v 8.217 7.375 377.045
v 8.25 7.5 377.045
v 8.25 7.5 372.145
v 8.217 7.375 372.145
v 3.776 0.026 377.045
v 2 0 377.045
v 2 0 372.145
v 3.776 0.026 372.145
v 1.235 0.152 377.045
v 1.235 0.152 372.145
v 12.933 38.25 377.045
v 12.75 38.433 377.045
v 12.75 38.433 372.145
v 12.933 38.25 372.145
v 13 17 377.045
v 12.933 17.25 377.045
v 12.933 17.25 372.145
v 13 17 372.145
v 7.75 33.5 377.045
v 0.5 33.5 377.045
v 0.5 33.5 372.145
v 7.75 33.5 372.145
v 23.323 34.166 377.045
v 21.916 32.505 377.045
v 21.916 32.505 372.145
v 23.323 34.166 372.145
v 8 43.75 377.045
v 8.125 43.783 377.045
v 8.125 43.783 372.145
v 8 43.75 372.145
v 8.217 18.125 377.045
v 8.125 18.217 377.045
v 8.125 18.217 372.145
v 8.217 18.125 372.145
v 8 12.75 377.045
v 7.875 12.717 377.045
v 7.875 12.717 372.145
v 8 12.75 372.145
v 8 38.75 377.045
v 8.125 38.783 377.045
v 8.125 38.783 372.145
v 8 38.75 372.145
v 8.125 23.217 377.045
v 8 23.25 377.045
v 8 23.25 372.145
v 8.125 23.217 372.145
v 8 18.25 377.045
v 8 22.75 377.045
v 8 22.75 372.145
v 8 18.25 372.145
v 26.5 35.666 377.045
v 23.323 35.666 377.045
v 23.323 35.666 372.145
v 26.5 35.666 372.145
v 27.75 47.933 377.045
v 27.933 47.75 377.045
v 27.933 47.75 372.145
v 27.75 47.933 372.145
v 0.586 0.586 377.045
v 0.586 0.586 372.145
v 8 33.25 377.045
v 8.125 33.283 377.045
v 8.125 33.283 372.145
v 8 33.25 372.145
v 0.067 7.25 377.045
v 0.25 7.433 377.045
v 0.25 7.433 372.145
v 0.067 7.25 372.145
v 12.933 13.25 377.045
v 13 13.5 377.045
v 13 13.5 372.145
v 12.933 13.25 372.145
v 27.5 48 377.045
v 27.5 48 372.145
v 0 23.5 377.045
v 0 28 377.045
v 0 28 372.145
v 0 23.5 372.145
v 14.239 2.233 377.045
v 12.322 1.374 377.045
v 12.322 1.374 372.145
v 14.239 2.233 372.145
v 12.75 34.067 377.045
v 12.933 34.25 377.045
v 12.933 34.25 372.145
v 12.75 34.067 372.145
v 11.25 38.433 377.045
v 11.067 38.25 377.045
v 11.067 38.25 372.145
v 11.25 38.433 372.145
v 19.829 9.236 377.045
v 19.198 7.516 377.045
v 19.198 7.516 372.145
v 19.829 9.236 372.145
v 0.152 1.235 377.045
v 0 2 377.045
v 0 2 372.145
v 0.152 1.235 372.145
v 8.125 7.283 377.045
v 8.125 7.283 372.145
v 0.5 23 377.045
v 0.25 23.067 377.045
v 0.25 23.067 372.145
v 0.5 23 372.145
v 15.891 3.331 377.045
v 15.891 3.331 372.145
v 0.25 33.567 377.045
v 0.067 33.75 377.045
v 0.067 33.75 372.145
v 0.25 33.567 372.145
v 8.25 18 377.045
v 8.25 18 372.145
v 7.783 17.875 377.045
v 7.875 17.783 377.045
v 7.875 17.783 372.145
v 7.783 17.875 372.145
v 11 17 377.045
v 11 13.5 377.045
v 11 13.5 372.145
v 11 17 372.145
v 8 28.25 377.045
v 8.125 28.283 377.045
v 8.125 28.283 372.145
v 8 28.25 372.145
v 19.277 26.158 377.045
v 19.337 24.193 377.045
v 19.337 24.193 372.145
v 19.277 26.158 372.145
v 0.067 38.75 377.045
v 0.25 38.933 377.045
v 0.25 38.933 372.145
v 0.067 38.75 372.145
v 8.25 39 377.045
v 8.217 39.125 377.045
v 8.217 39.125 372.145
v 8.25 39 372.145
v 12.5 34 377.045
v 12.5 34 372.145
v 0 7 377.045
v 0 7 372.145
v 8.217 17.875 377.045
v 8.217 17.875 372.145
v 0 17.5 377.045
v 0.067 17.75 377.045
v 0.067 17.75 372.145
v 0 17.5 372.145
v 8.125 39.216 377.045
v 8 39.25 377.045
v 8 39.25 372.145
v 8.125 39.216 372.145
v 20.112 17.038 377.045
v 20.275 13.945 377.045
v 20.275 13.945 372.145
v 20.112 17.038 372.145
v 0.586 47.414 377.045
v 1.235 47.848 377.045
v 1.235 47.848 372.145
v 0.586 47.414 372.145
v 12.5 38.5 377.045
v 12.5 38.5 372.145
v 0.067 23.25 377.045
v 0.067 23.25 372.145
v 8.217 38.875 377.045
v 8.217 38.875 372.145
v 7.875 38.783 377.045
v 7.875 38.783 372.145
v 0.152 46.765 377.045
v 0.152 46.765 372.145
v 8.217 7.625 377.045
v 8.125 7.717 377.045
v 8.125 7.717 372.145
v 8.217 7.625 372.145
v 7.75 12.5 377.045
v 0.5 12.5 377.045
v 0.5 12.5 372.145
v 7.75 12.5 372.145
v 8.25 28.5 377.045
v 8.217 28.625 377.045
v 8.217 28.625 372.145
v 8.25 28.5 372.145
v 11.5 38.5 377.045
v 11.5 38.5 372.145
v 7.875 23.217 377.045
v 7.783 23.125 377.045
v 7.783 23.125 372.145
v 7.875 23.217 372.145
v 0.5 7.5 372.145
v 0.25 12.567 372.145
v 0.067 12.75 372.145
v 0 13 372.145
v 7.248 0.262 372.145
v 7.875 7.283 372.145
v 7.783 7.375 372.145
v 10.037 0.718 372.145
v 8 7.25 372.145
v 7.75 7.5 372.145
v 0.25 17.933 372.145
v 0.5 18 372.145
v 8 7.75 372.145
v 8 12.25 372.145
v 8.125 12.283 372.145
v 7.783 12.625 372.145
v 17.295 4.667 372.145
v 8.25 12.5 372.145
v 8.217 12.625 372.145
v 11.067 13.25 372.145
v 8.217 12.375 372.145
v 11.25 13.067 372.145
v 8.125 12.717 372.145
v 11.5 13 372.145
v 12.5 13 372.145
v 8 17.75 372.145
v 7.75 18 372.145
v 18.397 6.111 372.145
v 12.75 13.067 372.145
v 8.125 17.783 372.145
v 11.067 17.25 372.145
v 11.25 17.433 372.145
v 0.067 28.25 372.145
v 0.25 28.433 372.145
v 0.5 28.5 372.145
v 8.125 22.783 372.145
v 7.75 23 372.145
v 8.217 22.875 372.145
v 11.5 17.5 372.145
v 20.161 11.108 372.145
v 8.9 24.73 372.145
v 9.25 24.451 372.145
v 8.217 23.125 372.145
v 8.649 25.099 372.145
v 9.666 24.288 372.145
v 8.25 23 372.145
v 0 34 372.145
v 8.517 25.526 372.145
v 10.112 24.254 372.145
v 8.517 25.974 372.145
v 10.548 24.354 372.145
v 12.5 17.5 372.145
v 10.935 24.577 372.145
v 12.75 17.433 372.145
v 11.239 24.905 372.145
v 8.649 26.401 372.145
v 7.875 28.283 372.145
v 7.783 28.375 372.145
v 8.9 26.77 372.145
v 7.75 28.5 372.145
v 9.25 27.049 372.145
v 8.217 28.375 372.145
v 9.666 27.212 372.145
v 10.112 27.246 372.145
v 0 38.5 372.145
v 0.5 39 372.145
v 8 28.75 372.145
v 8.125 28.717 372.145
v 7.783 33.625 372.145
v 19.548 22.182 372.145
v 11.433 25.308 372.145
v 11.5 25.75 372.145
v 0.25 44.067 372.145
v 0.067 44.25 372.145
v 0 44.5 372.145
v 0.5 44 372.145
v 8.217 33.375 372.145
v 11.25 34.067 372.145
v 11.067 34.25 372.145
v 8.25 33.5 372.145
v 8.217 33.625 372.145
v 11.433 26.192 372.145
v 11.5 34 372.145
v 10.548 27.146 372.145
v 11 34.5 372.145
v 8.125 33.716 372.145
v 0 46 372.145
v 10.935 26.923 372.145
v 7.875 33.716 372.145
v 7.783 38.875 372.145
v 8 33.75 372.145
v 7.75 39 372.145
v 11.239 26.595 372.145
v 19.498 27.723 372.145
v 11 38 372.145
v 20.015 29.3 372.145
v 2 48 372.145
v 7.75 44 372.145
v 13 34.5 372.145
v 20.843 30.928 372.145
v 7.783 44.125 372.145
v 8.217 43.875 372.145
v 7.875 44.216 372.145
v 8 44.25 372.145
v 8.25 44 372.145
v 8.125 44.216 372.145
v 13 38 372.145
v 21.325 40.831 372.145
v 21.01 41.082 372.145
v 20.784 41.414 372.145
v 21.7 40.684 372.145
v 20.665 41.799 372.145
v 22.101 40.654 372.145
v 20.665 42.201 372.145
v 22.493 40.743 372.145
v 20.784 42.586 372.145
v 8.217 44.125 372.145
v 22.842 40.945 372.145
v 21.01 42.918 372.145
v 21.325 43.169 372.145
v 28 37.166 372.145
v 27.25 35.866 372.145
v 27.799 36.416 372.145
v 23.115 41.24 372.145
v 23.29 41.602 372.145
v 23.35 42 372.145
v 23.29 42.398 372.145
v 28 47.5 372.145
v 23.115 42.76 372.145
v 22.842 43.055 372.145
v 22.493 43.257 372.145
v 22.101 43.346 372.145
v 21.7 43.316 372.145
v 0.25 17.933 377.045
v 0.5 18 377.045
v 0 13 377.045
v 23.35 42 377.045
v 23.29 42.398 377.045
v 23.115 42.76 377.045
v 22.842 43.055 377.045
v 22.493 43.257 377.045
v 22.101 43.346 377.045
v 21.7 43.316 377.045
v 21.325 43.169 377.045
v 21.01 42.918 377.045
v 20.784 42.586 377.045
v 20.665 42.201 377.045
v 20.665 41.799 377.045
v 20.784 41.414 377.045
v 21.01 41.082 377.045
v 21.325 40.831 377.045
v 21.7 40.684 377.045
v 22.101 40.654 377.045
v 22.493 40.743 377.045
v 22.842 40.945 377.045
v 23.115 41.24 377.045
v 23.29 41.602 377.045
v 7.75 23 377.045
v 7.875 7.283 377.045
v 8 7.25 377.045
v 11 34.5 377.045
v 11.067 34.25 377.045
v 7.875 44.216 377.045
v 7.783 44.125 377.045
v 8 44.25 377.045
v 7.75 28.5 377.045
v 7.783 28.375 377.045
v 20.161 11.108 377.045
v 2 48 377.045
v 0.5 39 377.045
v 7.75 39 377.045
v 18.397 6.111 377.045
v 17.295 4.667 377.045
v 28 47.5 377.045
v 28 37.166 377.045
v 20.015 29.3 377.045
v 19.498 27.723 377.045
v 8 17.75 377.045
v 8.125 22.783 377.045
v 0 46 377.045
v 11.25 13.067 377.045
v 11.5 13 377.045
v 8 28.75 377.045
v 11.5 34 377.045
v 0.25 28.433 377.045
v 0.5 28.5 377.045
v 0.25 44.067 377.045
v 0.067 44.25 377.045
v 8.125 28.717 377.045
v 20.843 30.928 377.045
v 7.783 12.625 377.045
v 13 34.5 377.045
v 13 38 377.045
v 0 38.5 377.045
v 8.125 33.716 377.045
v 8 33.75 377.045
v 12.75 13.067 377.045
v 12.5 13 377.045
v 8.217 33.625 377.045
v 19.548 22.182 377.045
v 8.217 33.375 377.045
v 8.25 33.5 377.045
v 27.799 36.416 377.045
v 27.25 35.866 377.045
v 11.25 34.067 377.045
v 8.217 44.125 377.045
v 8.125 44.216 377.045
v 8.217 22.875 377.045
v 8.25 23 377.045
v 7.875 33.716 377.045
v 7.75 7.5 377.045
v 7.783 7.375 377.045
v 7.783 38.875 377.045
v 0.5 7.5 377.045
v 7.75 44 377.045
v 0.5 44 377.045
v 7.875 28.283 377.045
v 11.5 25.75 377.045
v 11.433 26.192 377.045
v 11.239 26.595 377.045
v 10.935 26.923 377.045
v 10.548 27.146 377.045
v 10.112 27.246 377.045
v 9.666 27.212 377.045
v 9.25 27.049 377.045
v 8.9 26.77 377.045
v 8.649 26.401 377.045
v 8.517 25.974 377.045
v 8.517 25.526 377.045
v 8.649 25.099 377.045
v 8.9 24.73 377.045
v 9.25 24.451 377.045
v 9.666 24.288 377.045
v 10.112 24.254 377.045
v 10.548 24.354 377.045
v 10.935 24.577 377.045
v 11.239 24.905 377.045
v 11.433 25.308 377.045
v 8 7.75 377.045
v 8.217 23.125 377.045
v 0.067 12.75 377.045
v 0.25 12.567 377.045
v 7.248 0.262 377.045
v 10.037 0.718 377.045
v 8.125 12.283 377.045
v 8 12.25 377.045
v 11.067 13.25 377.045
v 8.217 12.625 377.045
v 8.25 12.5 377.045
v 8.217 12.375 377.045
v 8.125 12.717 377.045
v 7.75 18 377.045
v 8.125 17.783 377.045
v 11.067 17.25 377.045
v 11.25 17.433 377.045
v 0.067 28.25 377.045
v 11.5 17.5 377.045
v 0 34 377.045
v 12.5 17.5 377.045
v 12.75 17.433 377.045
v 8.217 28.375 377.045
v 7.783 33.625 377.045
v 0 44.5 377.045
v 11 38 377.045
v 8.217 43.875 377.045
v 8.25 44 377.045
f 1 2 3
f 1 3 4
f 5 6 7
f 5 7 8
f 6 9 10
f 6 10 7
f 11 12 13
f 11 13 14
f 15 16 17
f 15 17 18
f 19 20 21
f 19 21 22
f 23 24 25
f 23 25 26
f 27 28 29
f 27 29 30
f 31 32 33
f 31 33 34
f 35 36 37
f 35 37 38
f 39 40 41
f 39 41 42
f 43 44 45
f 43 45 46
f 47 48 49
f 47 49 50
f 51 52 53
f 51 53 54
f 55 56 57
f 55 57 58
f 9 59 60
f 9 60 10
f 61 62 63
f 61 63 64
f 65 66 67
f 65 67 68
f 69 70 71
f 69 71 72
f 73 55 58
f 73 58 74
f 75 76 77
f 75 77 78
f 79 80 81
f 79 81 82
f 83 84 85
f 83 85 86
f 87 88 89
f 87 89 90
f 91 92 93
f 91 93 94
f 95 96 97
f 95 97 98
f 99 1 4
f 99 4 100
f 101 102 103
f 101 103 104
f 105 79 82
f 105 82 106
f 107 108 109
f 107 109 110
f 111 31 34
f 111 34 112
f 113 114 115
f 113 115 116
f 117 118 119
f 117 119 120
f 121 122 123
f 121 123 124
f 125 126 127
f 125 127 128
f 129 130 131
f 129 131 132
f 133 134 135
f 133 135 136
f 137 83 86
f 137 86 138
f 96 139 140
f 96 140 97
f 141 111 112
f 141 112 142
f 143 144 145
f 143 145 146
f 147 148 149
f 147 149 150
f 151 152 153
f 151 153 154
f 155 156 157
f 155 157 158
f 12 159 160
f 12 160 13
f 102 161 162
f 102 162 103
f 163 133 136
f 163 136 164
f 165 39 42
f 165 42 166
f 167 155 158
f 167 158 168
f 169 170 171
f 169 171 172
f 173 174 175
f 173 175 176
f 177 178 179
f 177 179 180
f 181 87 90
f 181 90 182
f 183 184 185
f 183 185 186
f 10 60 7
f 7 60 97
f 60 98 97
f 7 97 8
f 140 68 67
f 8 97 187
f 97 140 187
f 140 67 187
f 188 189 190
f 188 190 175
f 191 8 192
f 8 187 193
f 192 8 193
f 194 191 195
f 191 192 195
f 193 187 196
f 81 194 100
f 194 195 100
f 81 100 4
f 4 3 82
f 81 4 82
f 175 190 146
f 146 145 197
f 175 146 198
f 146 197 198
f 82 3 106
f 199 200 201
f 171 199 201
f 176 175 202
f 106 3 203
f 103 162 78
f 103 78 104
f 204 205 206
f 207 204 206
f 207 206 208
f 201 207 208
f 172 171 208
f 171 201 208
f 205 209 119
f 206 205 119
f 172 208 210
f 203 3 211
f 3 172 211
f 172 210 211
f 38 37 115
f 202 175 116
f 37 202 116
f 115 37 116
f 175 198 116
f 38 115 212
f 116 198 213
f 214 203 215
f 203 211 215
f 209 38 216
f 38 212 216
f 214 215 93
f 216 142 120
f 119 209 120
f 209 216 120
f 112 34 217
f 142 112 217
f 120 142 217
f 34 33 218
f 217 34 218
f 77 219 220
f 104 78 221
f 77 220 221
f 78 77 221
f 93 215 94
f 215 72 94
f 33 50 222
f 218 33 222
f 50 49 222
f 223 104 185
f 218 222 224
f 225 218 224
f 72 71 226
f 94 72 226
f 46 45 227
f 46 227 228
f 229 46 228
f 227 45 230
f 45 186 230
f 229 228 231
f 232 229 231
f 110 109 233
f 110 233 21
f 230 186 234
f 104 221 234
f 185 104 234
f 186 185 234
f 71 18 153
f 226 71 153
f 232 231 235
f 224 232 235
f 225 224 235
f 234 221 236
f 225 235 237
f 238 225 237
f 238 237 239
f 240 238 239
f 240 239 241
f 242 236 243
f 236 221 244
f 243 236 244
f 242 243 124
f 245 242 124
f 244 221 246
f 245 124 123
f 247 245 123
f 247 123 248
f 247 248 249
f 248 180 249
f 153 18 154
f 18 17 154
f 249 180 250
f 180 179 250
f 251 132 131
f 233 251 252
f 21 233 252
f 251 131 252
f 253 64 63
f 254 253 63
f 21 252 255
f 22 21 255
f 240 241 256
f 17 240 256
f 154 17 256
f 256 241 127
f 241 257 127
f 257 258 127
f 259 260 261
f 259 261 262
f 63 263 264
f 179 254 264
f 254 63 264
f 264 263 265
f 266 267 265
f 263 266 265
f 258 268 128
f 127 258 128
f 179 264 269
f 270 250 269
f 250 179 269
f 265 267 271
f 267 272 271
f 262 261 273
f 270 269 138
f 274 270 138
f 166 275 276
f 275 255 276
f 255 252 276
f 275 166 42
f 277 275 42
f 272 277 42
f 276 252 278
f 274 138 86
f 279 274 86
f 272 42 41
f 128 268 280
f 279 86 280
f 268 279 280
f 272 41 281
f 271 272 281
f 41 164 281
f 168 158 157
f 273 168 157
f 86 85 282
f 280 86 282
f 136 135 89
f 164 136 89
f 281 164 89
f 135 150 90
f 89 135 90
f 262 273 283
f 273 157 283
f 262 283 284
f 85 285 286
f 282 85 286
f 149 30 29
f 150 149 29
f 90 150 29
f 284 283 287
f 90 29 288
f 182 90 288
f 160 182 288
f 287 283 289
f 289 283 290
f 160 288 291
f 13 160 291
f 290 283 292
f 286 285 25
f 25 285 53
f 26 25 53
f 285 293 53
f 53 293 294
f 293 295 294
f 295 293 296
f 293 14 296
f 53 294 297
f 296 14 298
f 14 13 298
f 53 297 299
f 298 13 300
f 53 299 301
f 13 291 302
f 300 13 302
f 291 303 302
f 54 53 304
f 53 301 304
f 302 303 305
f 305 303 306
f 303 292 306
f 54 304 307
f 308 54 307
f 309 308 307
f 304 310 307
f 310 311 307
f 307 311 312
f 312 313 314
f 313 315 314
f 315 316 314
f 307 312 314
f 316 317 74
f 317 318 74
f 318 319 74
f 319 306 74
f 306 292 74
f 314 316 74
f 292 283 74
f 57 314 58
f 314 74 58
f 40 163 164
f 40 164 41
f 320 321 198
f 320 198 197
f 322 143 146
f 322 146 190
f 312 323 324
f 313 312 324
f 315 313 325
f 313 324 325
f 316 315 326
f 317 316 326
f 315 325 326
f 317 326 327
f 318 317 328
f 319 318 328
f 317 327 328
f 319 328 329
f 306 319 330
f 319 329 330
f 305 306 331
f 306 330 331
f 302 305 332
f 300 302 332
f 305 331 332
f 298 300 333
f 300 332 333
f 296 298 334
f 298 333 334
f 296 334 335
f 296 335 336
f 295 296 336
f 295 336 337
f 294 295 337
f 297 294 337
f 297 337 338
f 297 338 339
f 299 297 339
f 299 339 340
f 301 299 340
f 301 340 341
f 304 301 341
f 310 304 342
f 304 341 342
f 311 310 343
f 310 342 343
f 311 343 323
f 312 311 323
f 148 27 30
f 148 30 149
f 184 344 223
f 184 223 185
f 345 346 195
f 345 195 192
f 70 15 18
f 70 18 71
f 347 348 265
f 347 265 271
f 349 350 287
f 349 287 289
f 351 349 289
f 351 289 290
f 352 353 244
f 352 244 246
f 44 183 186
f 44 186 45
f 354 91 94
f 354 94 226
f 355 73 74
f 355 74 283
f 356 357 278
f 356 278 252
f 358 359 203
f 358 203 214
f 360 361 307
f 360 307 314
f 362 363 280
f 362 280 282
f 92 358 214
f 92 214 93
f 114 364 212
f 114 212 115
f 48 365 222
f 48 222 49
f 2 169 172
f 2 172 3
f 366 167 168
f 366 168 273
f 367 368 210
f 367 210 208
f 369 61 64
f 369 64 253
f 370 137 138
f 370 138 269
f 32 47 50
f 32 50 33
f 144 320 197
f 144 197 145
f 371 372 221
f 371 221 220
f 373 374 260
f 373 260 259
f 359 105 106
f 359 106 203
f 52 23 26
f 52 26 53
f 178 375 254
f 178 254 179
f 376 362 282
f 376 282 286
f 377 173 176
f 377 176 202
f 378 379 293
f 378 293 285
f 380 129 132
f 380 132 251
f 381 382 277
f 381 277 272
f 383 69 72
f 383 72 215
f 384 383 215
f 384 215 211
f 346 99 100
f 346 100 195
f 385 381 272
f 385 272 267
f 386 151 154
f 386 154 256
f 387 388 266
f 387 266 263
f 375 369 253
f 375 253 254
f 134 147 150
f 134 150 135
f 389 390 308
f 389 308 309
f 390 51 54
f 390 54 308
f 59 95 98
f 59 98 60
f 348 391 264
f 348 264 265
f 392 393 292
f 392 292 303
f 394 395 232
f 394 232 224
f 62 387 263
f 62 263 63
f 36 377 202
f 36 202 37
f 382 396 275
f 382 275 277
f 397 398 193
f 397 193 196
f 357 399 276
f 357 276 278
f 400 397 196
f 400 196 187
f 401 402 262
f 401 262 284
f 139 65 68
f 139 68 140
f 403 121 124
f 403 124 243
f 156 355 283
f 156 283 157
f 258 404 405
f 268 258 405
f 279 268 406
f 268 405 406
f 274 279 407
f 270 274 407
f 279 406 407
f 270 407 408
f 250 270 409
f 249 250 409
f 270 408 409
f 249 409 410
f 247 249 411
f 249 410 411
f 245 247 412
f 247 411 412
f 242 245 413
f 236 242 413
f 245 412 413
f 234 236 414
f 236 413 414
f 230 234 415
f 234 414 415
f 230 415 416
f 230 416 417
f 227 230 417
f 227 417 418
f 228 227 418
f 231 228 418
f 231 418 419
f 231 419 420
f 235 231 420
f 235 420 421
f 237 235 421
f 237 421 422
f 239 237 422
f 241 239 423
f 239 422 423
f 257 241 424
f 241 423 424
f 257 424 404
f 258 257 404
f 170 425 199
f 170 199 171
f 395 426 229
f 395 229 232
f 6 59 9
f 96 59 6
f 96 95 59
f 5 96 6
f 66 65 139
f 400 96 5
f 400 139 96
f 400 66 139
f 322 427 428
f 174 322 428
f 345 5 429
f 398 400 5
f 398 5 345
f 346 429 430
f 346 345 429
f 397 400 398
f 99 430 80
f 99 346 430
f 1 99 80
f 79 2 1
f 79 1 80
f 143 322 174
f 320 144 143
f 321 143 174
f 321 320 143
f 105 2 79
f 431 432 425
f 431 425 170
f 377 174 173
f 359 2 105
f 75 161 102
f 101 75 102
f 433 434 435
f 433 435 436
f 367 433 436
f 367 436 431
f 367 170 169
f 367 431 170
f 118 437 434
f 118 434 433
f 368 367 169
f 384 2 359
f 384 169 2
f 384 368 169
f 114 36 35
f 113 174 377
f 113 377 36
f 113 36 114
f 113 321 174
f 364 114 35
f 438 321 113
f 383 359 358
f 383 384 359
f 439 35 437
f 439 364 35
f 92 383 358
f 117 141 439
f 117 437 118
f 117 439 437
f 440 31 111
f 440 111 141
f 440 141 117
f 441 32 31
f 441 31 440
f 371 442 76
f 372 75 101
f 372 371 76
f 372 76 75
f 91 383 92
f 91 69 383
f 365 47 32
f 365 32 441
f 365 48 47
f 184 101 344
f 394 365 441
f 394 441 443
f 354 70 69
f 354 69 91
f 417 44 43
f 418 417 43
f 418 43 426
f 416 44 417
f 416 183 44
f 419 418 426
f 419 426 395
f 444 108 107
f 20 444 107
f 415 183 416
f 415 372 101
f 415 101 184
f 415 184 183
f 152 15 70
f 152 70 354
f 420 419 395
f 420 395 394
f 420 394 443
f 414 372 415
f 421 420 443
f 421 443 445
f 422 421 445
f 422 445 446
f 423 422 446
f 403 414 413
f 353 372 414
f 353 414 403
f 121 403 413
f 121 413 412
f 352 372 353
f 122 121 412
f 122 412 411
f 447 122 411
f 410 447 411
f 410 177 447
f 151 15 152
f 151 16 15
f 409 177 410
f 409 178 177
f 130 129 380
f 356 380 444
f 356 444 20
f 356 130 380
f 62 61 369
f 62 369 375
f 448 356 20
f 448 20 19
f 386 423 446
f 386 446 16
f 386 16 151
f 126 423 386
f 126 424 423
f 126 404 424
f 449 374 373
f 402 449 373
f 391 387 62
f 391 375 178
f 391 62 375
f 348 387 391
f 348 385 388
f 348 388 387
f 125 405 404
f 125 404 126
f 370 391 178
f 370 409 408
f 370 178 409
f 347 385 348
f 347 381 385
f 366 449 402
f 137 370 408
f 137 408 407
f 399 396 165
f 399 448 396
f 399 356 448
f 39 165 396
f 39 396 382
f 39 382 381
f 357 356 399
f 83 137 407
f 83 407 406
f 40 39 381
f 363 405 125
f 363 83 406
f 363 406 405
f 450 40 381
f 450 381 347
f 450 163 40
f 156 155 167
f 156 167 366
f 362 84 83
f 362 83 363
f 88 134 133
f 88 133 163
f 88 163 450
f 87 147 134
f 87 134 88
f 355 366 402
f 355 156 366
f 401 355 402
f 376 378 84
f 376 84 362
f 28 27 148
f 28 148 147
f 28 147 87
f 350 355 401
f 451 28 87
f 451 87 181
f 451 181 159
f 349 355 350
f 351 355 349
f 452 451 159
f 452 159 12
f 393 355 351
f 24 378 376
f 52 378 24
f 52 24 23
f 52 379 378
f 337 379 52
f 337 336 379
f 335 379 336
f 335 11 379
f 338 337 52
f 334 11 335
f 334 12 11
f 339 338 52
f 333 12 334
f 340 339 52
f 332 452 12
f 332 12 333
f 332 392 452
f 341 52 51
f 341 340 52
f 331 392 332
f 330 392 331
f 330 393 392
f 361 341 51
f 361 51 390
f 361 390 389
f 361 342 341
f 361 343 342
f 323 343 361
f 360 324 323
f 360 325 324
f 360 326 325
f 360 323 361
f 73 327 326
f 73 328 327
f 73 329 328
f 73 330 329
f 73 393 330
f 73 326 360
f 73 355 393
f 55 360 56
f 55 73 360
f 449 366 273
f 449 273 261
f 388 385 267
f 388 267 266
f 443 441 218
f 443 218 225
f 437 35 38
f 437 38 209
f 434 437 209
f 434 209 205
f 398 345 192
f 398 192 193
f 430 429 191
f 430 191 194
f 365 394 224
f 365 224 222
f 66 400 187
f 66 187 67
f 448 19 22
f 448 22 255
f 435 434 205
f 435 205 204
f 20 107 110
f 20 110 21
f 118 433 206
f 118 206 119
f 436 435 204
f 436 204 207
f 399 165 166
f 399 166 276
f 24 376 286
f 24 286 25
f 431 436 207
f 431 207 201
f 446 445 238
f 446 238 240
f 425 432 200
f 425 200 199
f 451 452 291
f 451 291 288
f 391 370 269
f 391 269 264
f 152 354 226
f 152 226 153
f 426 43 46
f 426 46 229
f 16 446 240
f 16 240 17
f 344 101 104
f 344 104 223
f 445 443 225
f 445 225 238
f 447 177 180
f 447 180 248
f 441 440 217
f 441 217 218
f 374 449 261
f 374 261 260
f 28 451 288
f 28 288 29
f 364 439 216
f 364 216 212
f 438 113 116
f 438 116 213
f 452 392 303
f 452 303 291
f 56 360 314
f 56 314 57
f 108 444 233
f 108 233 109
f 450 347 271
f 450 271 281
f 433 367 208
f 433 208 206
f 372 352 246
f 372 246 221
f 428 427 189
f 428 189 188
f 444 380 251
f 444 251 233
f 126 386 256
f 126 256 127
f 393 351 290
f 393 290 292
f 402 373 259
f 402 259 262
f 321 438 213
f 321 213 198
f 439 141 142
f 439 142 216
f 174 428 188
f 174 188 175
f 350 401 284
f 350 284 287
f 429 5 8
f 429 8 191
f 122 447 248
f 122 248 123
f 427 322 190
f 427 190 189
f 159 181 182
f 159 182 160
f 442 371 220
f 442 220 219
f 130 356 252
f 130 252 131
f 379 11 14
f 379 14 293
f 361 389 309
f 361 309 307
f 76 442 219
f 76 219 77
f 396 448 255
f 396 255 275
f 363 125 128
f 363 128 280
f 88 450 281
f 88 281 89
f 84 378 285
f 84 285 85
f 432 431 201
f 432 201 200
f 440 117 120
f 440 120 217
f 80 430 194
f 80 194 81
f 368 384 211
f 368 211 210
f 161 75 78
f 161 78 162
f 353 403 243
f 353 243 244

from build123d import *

# Parameters (mm, degrees)
ESQUISSE1_R        = 1.35
ESQUISSE1_R_2      = 1.5
BOSS_EXTRU_1_DEPTH = 4.9


with BuildPart() as part:
    # Esquisse1 → Boss.-Extru.1 (new body)
    with BuildSketch(Plane.XY.offset(377.0447)):
        Polygon((15.891185209, 3.330523996), (17.295074786, 4.667009593), (18.397064454, 6.110993158), (19.198464212, 7.515709734), (19.829414022, 9.236036216), (20.160733922, 11.107826651), (20.275133888, 13.944835796), (20.111733937, 17.038324864), (19.548124107, 22.181683313), (19.336824171, 24.193402707), (19.277384189, 26.157782114), (19.497574122, 27.722941643), (20.015153966, 29.300491167), (20.842573717, 30.928140676), (21.916433393, 32.504840201), (23.323482969, 34.1655297), (23.323482969, 35.665529248), (26.499992011, 35.665529248), (27.249991785, 35.866489188), (27.79903162, 36.415529022), (27.999991559, 37.165528796), (27.999991559, 47.499985681), (27.933001579, 47.749985605), (27.749991634, 47.93299555), (27.49999171, 47.99998553), (1.999999397, 47.99998553), (1.234632628, 47.847745576), (0.585786323, 47.414205706), (0.152240954, 46.765355902), (0, 45.999986133), (0, 44.499986585), (0.06698734, 44.24998666), (0.249999925, 44.066976716), (0.499999949, 43.999986736), (7.749997664, 43.999986736), (7.783491654, 44.124986698), (7.874997626, 44.21649667), (7.999997588, 44.24998666), (8.124997551, 44.21649667), (8.216504523, 44.124986698), (8.249997513, 43.999986736), (8.216504523, 43.874986773), (8.124997551, 43.783476801), (7.999997588, 43.749986811), (7.999997588, 39.249988168), (8.124997551, 39.216498178), (8.216504523, 39.124988205), (8.249997513, 38.999988243), (8.216504523, 38.874988281), (8.124997551, 38.783478308), (7.999997588, 38.749988318), (7.874997626, 38.783478308), (7.783491654, 38.874988281), (7.749997664, 38.999988243), (0.499999949, 38.999988243), (0.249999925, 38.932998263), (0.06698734, 38.749988318), (0, 38.499988394), (0, 33.99998975), (0.06698734, 33.749989826), (0.249999925, 33.566979881), (0.499999949, 33.499989901), (7.749997664, 33.499989901), (7.783491654, 33.624989863), (7.874997626, 33.716499836), (7.999997588, 33.749989826), (8.124997551, 33.716499836), (8.216504523, 33.624989863), (8.249997513, 33.499989901), (8.216504523, 33.374989939), (8.124997551, 33.283479966), (7.999997588, 33.249989976), (7.999997588, 28.749991333), (8.124997551, 28.716501343), (8.216504523, 28.624991371), (8.249997513, 28.499991408), (8.216504523, 28.374991446), (8.124997551, 28.283481474), (7.999997588, 28.249991484), (7.874997626, 28.283481474), (7.783491654, 28.374991446), (7.749997664, 28.499991408), (0.499999949, 28.499991408), (0.249999925, 28.433001429), (0.06698734, 28.249991484), (0, 27.999991559), (0, 23.499992916), (0.06698734, 23.249992991), (0.249999925, 23.066983046), (0.499999949, 22.999993066), (7.749997664, 22.999993066), (7.783491654, 23.124993029), (7.874997626, 23.216503001), (7.999997588, 23.249992991), (8.124997551, 23.216503001), (8.216504523, 23.124993029), (8.249997513, 22.999993066), (8.216504523, 22.874993104), (8.124997551, 22.783483132), (7.999997588, 22.749993142), (7.999997588, 18.249994498), (8.124997551, 18.216504508), (8.216504523, 18.124994536), (8.249997513, 17.999994574), (8.216504523, 17.874994611), (8.124997551, 17.783484639), (7.999997588, 17.749994649), (7.874997626, 17.783484639), (7.783491654, 17.874994611), (7.749997664, 17.999994574), (0.499999949, 17.999994574), (0.249999925, 17.933004594), (0.06698734, 17.749994649), (0, 17.499994724), (0, 12.999996081), (0.06698734, 12.749996156), (0.249999925, 12.566986212), (0.499999949, 12.499996232), (7.749997664, 12.499996232), (7.783491654, 12.624996194), (7.874997626, 12.716506166), (7.999997588, 12.749996156), (8.124997551, 12.716506166), (8.216504523, 12.624996194), (8.249997513, 12.499996232), (8.216504523, 12.374996269), (8.124997551, 12.283486297), (7.999997588, 12.249996307), (7.999997588, 7.749997664), (8.124997551, 7.716503674), (8.216504523, 7.624997701), (8.249997513, 7.499997739), (8.216504523, 7.374997777), (8.124997551, 7.283491804), (7.999997588, 7.249997814), (7.874997626, 7.283491804), (7.783491654, 7.374997777), (7.749997664, 7.499997739), (0.499999949, 7.499997739), (0.249999925, 7.433009759), (0.06698734, 7.249997814), (0, 6.99999789), (0, 1.999999397), (0.152240954, 1.234632628), (0.585786323, 0.585786223), (1.234632628, 0.152240854), (1.999999397, 0), (3.776477862, 0.025545672), (7.248430815, 0.262472121), (10.036716974, 0.718076284), (12.321666285, 1.373609586), (14.238535708, 2.233213327), align=None)
        with Locations((21.999992961, 41.999982339)):
            Circle(ESQUISSE1_R, mode=Mode.SUBTRACT)
        with Locations((9.99999793, 25.749992786)):
            Circle(ESQUISSE1_R_2, mode=Mode.SUBTRACT)
        Polygon((12.933006101, 13.249996006), (12.749996156, 13.066986061), (12.499996232, 12.999996081), (11.499996533, 12.999996081), (11.249996609, 13.066986061), (11.066986664, 13.249996006), (10.999996684, 13.49999593), (10.999996684, 16.999994875), (11.066986664, 17.2499948), (11.249996609, 17.433004745), (11.499996533, 17.499994724), (12.499996232, 17.499994724), (12.749996156, 17.433004745), (12.933006101, 17.2499948), (12.999996081, 16.999994875), (12.999996081, 13.49999593), align=None, mode=Mode.SUBTRACT)
        Polygon((11.249996609, 34.06697973), (11.066986664, 34.249989675), (10.999996684, 34.4999896), (10.999996684, 37.999988544), (11.066986664, 38.249988469), (11.249996609, 38.432998414), (11.499996533, 38.499988394), (12.499996232, 38.499988394), (12.749996156, 38.432998414), (12.933006101, 38.249988469), (12.999996081, 37.999988544), (12.999996081, 34.4999896), (12.933006101, 34.249989675), (12.749996156, 34.06697973), (12.499996232, 33.99998975), (11.499996533, 33.99998975), align=None, mode=Mode.SUBTRACT)
    extrude(amount=-BOSS_EXTRU_1_DEPTH)


solid = part.part
